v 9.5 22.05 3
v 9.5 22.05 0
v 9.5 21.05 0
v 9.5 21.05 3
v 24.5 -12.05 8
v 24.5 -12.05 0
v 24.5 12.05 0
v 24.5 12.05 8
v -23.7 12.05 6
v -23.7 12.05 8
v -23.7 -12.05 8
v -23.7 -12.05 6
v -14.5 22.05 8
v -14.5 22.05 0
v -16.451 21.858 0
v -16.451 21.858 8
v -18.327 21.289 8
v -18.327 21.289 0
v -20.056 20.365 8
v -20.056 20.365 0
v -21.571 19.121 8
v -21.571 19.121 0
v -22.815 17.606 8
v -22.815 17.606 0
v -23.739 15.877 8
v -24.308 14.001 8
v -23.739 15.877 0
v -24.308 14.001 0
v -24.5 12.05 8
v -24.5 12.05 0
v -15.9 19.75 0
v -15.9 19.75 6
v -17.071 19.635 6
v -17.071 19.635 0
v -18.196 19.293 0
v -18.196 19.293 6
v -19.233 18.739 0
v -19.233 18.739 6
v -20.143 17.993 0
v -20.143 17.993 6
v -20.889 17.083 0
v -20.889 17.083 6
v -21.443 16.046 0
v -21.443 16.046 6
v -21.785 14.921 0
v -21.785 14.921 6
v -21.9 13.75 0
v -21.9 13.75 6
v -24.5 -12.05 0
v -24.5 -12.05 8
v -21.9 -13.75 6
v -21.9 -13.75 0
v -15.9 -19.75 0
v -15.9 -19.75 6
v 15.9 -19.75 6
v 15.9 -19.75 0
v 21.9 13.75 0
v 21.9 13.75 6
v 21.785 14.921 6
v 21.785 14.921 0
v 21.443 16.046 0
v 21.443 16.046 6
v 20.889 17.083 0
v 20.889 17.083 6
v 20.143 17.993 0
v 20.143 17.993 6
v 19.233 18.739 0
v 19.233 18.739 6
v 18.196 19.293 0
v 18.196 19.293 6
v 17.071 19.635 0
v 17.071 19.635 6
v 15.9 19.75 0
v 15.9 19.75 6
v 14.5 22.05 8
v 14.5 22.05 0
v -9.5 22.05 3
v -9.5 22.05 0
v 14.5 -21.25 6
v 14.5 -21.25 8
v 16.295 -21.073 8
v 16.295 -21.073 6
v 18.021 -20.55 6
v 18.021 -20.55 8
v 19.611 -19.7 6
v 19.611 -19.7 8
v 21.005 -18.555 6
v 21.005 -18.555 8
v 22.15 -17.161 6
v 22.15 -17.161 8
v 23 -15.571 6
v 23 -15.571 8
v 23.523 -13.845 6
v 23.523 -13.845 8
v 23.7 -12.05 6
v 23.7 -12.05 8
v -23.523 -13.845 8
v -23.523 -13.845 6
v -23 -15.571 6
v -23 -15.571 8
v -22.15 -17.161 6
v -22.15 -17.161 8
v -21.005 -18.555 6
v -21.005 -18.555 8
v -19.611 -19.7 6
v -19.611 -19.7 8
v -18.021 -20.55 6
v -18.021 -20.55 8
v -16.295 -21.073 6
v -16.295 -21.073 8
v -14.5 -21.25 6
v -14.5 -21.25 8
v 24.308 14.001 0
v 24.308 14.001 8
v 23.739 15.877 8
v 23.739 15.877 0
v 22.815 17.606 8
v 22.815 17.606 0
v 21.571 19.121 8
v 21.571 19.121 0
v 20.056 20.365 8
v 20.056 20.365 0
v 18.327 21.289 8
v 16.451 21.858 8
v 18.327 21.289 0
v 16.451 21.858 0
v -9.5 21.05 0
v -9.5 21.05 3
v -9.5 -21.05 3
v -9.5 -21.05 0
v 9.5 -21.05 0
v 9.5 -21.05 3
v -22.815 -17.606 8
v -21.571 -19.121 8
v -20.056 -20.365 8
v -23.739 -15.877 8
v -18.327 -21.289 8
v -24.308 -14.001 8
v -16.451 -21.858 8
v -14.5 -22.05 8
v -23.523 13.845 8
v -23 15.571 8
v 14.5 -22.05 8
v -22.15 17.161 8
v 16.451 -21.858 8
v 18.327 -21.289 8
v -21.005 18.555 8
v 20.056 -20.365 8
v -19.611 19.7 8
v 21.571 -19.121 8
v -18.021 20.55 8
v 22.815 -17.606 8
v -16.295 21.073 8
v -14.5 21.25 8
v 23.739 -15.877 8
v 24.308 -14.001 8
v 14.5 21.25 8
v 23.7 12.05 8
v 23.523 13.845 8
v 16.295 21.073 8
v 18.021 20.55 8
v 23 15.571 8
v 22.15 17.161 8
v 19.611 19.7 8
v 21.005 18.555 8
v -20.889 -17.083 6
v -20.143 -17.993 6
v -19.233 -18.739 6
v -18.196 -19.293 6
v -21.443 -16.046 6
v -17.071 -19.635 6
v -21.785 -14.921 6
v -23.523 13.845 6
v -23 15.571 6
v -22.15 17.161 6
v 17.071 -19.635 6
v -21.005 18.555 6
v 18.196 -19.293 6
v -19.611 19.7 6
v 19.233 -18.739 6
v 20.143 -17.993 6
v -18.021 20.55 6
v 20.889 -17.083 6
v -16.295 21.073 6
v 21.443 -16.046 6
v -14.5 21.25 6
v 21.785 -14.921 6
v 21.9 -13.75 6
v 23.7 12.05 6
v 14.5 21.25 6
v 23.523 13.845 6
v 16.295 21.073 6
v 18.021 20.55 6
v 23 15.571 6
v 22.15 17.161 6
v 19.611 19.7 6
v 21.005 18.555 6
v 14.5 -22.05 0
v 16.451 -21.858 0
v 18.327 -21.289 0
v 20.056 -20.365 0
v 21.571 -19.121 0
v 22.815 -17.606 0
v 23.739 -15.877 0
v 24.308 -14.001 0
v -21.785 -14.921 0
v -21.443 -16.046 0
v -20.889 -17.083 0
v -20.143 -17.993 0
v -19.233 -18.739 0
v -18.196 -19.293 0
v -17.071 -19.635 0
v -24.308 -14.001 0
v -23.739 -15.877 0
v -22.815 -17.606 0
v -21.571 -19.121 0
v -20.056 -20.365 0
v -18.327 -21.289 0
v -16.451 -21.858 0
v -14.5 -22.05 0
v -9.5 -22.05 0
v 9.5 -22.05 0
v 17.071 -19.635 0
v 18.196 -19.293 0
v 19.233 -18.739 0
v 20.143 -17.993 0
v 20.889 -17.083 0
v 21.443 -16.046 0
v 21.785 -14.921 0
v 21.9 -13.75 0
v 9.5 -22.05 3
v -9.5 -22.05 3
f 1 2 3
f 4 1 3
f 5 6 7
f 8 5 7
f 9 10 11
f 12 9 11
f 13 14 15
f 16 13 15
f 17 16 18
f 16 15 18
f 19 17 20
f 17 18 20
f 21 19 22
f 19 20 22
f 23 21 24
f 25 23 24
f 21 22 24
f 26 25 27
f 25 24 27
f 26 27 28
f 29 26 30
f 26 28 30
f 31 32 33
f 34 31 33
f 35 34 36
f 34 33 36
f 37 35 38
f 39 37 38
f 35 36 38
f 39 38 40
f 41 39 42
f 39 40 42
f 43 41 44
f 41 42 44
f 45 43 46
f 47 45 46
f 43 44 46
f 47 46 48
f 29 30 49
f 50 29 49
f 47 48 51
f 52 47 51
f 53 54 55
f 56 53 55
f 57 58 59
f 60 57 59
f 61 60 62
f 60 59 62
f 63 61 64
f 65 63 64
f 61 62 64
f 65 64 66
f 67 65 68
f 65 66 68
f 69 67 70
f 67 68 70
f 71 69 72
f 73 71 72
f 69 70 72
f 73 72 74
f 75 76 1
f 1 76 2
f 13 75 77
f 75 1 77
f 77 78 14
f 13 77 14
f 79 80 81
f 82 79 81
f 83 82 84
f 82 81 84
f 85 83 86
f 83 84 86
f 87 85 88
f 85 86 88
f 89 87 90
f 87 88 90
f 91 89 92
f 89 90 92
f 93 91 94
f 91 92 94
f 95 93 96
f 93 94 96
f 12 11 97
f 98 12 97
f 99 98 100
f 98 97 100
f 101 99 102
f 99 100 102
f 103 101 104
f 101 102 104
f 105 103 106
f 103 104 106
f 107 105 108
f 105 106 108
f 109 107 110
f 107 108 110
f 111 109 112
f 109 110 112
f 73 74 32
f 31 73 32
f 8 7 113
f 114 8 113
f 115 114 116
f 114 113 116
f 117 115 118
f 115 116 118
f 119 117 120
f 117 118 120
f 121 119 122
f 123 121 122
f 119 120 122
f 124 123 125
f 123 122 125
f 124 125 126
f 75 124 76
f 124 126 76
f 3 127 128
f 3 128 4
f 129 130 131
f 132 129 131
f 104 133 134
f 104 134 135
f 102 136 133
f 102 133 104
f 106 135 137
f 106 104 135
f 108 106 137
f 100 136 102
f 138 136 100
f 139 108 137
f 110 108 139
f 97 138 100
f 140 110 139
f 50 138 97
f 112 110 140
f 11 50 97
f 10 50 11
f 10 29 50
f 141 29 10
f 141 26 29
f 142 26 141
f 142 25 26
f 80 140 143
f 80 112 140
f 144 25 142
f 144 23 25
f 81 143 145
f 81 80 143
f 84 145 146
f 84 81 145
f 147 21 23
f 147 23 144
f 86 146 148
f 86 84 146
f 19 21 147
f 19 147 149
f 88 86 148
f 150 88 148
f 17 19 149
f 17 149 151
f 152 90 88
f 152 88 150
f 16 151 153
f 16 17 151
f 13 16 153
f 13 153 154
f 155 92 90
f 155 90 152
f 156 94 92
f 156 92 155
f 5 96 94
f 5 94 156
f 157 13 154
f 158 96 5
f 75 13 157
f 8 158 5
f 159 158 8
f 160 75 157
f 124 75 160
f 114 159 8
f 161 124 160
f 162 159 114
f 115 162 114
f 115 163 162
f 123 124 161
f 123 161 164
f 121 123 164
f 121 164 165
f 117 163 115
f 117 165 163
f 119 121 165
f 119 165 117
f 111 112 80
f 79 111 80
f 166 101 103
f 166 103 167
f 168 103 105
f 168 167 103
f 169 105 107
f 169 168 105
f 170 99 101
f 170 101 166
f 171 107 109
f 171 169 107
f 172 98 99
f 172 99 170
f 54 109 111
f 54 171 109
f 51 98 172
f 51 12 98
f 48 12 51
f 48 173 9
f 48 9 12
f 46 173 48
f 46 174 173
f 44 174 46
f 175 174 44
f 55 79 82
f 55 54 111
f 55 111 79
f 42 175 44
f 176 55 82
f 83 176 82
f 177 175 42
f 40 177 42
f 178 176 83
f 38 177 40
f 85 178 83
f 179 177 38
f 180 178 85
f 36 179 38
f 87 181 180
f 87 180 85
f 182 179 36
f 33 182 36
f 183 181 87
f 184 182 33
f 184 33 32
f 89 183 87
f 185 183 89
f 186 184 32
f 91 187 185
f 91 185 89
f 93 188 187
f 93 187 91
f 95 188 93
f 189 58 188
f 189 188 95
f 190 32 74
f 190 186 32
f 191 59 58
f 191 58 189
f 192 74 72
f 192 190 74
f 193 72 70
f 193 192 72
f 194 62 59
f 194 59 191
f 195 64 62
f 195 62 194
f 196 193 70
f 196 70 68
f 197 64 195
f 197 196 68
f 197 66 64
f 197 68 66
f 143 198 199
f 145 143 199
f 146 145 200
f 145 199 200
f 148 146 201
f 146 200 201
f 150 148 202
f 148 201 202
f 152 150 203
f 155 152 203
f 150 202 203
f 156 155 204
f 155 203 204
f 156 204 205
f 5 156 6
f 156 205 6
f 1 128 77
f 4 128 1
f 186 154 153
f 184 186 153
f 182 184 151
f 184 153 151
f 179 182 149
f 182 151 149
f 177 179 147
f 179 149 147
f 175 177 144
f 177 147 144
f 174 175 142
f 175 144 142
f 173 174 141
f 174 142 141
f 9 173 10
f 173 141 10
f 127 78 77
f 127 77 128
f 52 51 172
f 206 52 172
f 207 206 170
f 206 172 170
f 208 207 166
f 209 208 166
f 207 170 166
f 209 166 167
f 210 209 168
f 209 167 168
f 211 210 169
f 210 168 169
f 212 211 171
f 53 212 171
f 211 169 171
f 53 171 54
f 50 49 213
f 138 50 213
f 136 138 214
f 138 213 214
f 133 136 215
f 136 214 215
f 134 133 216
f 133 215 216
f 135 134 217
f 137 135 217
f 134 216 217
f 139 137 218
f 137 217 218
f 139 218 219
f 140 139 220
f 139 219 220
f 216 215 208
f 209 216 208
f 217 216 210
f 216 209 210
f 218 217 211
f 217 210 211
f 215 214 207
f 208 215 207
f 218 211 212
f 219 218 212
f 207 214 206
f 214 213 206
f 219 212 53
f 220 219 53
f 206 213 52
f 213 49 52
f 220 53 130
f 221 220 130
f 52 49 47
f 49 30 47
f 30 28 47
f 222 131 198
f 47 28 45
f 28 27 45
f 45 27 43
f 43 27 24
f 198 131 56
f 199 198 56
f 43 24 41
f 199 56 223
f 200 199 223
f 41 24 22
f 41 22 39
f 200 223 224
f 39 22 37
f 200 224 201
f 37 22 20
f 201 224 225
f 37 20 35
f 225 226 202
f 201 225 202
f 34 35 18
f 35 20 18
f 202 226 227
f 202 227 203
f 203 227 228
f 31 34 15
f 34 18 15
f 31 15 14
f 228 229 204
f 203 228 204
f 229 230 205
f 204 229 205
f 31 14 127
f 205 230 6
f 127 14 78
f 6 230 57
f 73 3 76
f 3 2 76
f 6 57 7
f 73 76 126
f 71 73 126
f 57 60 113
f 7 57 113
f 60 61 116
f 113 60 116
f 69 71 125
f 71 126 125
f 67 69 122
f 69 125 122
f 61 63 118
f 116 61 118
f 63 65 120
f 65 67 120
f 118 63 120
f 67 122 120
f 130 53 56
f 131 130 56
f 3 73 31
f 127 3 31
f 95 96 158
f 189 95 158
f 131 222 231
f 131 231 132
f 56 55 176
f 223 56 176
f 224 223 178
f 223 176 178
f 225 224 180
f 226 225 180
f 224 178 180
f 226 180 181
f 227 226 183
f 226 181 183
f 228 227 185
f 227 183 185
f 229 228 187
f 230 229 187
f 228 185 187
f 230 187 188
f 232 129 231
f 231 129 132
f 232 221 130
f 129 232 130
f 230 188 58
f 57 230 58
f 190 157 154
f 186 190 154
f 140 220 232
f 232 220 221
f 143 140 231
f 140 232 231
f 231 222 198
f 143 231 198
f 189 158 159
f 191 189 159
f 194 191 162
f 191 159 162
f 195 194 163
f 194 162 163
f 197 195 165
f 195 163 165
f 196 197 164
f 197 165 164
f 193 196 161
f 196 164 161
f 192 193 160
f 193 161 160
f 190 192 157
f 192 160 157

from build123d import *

# Parameters (mm, degrees)
F1_DEPTH = 8
F3_DEPTH = 8.001
F5_DEPTH = 2
F6_W     = 19
F6_H     = 1
F7_DEPTH = 3
F8_W     = 19
F8_H     = 1
F9_DEPTH = 3


with BuildPart() as f1:
    # F0 (on Top) → F1 (new body)
    with BuildSketch(Plane.XY):
        with BuildLine():
            Line((-14.5, -22.05), (14.5, -22.05))
            ThreePointArc((14.5, -22.05), (21.5710678119, -19.1210678119), (24.5, -12.05))
            Line((24.5, -12.05), (24.5, 12.05))
            ThreePointArc((24.5, 12.05), (21.5710678119, 19.1210678119), (14.5, 22.05))
            Line((14.5, 22.05), (-14.5, 22.05))
            ThreePointArc((-14.5, 22.05), (-21.5710678119, 19.1210678119), (-24.5, 12.05))
            Line((-24.5, 12.05), (-24.5, -12.05))
            ThreePointArc((-24.5, -12.05), (-21.5710678119, -19.1210678119), (-14.5, -22.05))
        make_face()
    extrude(amount=F1_DEPTH)

    # F2 (on face) → F3 (cut, through all)
    with BuildSketch(Plane.XY.offset(8)):
        with BuildLine():
            Line((-15.9, -19.75), (15.9, -19.75))
            ThreePointArc((15.9, -19.75), (20.1426406871, -17.9926406871), (21.9, -13.75))
            Line((21.9, -13.75), (21.9, 13.75))
            ThreePointArc((21.9, 13.75), (20.1426406871, 17.9926406871), (15.9, 19.75))
            Line((15.9, 19.75), (-15.9, 19.75))
            ThreePointArc((-15.9, 19.75), (-20.1426406871, 17.9926406871), (-21.9, 13.75))
            Line((-21.9, 13.75), (-21.9, -13.75))
            ThreePointArc((-21.9, -13.75), (-20.1426406871, -17.9926406871), (-15.9, -19.75))
        make_face()
    extrude(amount=-F3_DEPTH, mode=Mode.SUBTRACT)

    # F4 (on face) → F5 (cut)
    with BuildSketch(Plane.XY.offset(8)):
        with BuildLine():
            ThreePointArc((14.5, -21.25), (21.0053823869, -18.5553823869), (23.7, -12.05))
            Line((23.7, -12.05), (23.7, 12.05))
            ThreePointArc((23.7, 12.05), (21.0053823869, 18.5553823869), (14.5, 21.25))
            Line((14.5, 21.25), (-14.5, 21.25))
            ThreePointArc((-14.5, 21.25), (-21.0053823869, 18.5553823869), (-23.7, 12.05))
            Line((-23.7, 12.05), (-23.7, -12.05))
            ThreePointArc((-23.7, -12.05), (-21.0053823869, -18.5553823869), (-14.5, -21.25))
            Line((-14.5, -21.25), (14.5, -21.25))
        make_face()
    extrude(amount=-F5_DEPTH, mode=Mode.SUBTRACT)

    # F6 (on Top) → F7 (cut)
    with BuildSketch(Plane.XY):
        with Locations((0, -21.55)):
            Rectangle(F6_W, F6_H)
    extrude(amount=F7_DEPTH, mode=Mode.SUBTRACT)

    # F8 (on face) → F9 (cut)
    with BuildSketch(Plane(origin=(0, 0, 0), x_dir=(1, 0, 0), z_dir=(0, 0, -1))):
        with Locations((0, -21.55)):
            Rectangle(F8_W, F8_H)
    extrude(amount=-F9_DEPTH, mode=Mode.SUBTRACT)


solid = f1.part
